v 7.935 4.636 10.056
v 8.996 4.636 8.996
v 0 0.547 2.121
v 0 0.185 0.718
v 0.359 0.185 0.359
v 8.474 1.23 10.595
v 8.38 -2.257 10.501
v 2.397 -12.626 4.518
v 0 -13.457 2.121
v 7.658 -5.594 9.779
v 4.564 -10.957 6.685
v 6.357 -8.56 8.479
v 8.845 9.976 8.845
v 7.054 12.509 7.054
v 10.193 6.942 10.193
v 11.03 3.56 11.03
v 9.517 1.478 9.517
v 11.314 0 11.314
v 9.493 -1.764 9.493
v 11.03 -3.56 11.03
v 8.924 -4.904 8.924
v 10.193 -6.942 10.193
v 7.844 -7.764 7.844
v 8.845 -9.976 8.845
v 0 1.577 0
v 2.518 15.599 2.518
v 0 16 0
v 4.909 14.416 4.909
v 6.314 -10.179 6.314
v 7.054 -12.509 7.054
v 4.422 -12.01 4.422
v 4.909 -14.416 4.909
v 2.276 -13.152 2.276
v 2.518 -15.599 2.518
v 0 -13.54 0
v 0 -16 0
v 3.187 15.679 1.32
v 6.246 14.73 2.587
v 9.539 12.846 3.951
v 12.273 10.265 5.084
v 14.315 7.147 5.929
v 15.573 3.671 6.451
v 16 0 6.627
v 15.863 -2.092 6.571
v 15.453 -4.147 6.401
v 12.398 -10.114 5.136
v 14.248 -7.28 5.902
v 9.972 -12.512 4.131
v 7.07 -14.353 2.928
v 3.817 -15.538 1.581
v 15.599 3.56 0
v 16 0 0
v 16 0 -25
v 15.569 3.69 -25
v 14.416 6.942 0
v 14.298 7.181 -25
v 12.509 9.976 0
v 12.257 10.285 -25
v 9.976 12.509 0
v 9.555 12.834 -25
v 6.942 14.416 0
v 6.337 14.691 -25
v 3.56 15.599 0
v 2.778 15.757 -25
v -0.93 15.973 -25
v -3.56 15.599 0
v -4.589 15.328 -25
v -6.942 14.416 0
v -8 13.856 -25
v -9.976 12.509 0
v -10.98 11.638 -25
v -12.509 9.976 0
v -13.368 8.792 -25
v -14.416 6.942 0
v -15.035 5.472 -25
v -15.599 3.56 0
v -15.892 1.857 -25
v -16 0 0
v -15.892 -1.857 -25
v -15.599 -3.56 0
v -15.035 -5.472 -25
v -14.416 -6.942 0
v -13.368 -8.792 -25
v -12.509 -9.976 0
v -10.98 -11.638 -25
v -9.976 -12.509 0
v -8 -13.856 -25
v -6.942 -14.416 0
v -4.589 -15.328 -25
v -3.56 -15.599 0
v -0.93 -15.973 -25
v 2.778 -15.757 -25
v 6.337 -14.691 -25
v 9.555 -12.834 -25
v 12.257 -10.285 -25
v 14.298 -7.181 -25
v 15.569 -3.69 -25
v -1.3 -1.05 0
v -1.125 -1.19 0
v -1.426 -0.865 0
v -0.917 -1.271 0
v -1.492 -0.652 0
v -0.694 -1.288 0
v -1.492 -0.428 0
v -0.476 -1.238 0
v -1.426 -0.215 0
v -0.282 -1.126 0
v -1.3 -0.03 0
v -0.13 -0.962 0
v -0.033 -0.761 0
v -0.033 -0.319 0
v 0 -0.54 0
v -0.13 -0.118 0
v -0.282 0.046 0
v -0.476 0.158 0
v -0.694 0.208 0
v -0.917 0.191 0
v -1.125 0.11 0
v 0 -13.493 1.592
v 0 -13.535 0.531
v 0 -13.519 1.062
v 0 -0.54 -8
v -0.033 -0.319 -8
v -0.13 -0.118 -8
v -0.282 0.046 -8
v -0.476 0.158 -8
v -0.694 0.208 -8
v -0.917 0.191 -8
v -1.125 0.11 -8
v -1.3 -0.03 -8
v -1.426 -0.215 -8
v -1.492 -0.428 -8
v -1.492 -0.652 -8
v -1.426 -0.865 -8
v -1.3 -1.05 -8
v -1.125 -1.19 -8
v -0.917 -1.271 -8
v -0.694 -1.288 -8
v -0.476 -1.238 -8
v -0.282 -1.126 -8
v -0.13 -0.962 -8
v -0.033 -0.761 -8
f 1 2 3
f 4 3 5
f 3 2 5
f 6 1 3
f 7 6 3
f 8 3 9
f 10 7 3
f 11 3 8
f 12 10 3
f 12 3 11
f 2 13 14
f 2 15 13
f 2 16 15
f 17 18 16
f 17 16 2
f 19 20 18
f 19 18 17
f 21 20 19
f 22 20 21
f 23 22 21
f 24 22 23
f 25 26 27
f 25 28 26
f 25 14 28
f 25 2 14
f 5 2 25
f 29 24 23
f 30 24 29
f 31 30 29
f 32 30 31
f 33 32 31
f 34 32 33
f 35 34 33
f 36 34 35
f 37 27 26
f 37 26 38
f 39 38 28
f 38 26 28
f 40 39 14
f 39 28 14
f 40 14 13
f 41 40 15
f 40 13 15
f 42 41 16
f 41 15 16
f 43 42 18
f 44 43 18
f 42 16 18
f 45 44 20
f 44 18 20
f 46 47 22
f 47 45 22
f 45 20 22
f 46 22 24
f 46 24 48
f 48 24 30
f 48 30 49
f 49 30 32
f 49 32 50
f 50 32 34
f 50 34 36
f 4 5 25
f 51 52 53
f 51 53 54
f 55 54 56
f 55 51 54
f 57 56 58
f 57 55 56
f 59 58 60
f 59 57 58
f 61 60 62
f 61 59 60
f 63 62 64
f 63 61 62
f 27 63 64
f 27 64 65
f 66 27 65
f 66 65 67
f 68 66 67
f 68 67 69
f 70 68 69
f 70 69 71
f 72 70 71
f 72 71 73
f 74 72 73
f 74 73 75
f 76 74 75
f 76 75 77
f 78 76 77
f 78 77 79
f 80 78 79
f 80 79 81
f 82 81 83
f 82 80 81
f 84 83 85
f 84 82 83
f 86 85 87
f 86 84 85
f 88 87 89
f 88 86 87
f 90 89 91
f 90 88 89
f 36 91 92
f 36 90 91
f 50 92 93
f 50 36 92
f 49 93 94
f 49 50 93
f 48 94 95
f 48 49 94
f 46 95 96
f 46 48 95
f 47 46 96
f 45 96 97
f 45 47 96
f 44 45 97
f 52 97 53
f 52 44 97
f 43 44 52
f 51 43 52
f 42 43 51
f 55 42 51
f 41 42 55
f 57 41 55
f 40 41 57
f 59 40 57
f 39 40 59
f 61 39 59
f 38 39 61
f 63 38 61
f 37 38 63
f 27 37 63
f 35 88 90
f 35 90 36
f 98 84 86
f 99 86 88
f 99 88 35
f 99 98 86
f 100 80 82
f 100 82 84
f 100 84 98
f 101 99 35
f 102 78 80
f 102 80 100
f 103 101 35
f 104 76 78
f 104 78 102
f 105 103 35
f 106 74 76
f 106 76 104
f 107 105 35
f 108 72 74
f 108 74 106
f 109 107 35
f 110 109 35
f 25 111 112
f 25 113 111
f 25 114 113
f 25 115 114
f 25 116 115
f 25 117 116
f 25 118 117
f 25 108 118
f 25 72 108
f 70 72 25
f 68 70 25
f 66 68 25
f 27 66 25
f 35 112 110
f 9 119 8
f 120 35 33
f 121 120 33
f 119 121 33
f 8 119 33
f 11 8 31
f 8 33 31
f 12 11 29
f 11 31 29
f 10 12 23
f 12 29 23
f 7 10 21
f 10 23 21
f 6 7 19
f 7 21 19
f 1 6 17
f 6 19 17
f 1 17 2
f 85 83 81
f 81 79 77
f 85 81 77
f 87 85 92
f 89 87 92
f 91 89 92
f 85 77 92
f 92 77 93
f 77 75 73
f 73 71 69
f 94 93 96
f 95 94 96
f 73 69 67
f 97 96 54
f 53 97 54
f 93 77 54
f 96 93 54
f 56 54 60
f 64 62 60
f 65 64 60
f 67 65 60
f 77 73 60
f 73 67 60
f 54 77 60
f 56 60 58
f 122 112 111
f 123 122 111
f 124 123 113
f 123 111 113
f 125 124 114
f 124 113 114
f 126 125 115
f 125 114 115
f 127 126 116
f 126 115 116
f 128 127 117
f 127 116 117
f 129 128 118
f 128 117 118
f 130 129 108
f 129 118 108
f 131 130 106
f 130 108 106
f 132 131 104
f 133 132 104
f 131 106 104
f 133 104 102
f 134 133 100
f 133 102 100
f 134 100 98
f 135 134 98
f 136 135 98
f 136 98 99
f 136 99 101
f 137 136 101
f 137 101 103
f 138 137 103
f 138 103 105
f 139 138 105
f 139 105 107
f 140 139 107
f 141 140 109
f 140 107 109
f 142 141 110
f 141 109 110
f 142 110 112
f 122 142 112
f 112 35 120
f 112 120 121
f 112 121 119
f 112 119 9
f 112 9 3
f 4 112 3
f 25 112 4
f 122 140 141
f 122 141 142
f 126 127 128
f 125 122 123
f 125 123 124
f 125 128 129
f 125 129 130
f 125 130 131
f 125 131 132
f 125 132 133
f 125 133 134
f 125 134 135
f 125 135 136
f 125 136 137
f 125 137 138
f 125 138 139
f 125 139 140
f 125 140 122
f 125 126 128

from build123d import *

# Parameters (mm, degrees)
F2_DEPTH  = 16
F0_R      = 16
F3_DEPTH  = 25
F4_DEPTH  = 25
F6_DEPTH  = 1.5
F8_DEPTH  = 10
F10_DEPTH = 25
F11_R     = 0.75
F12_DEPTH = 8
F14_DEPTH = 25


with BuildPart() as f2:
    # F1 (on Front) → F2 (new body, symmetric)
    with BuildSketch(Plane.XZ):
        Polygon((16, 16), (0, 0), (16, 0), align=None)
    extrude(amount=F2_DEPTH, both=True)

    # F0 (on Top) → F3 (intersect)
    with BuildSketch(Plane.XY):
        Circle(F0_R)
    extrude(amount=F3_DEPTH, mode=Mode.INTERSECT)

    # F0 (on Top) → F4 (join)
    with BuildSketch(Plane.XY):
        Circle(F0_R)
    extrude(amount=-F4_DEPTH)

    # F5 (on face) → F6 (join)
    with BuildSketch(Plane(origin=(0, 0, 0), x_dir=(0, -1, 0), z_dir=(-0.707107, 0, 0.707107))):
        with BuildLine():
            Line((-0.184881, 0.507365), (0, 0))
            Line((0, 0), (0.54, 0))
            Line((0.54, 0), (13.54, 0))
            ThreePointArc((13.54, 0), (7.76415, 11.092771), (-4.635713, 12.721704))
            Line((-4.635713, 12.721704), (-0.184881, 0.507365))
        make_face()
    extrude(amount=F6_DEPTH)

    # F7 (on face) → F8 (join)
    with BuildSketch(Plane(origin=(0, 0, 0), x_dir=(0, -1, 0), z_dir=(-0.707107, 0, 0.707107))):
        Polygon((0, 0), (-0.184881, 0.507365), (-1.577233, 0), align=None)
    extrude(amount=F8_DEPTH)

    # F9 (on face) → F10 (cut)
    with BuildSketch(Plane.XY):
        with BuildLine():
            ThreePointArc((0, 16), (-16, 0), (0, -16))
            Line((0, -16), (0, 16))
        make_face()
    extrude(amount=F10_DEPTH, mode=Mode.SUBTRACT)

    # F11 (on face) → F12 (cut)
    with BuildSketch(Plane.XY):
        with Locations((-0.75, -0.54)):
            Circle(F11_R)
    extrude(amount=-F12_DEPTH, mode=Mode.SUBTRACT)

    # F13 (on face) → F14 (cut)
    with BuildSketch(Plane(origin=(0, 0, 0), x_dir=(0, -1, 0), z_dir=(-0.707107, 0, 0.707107))):
        with BuildLine():
            ThreePointArc((-16, 0), (0, 16), (16, 0))
            add(Edge.make_bspline(
                [(16, 0), (16, 22.627417), (0, 22.627417)],
                knots=[1.570796, 1.570796, 1.570796, 3.141593, 3.141593, 3.141593], degree=2, weights=[1, 0.707107, 1]))
            add(Edge.make_bspline(
                [(0, 22.627417), (-16, 22.627417), (-16, 0)],
                knots=[3.141593, 3.141593, 3.141593, 4.712389, 4.712389, 4.712389], degree=2, weights=[1, 0.707107, 1]))
        make_face()
    extrude(amount=-F14_DEPTH, mode=Mode.SUBTRACT)


solid = f2.part
